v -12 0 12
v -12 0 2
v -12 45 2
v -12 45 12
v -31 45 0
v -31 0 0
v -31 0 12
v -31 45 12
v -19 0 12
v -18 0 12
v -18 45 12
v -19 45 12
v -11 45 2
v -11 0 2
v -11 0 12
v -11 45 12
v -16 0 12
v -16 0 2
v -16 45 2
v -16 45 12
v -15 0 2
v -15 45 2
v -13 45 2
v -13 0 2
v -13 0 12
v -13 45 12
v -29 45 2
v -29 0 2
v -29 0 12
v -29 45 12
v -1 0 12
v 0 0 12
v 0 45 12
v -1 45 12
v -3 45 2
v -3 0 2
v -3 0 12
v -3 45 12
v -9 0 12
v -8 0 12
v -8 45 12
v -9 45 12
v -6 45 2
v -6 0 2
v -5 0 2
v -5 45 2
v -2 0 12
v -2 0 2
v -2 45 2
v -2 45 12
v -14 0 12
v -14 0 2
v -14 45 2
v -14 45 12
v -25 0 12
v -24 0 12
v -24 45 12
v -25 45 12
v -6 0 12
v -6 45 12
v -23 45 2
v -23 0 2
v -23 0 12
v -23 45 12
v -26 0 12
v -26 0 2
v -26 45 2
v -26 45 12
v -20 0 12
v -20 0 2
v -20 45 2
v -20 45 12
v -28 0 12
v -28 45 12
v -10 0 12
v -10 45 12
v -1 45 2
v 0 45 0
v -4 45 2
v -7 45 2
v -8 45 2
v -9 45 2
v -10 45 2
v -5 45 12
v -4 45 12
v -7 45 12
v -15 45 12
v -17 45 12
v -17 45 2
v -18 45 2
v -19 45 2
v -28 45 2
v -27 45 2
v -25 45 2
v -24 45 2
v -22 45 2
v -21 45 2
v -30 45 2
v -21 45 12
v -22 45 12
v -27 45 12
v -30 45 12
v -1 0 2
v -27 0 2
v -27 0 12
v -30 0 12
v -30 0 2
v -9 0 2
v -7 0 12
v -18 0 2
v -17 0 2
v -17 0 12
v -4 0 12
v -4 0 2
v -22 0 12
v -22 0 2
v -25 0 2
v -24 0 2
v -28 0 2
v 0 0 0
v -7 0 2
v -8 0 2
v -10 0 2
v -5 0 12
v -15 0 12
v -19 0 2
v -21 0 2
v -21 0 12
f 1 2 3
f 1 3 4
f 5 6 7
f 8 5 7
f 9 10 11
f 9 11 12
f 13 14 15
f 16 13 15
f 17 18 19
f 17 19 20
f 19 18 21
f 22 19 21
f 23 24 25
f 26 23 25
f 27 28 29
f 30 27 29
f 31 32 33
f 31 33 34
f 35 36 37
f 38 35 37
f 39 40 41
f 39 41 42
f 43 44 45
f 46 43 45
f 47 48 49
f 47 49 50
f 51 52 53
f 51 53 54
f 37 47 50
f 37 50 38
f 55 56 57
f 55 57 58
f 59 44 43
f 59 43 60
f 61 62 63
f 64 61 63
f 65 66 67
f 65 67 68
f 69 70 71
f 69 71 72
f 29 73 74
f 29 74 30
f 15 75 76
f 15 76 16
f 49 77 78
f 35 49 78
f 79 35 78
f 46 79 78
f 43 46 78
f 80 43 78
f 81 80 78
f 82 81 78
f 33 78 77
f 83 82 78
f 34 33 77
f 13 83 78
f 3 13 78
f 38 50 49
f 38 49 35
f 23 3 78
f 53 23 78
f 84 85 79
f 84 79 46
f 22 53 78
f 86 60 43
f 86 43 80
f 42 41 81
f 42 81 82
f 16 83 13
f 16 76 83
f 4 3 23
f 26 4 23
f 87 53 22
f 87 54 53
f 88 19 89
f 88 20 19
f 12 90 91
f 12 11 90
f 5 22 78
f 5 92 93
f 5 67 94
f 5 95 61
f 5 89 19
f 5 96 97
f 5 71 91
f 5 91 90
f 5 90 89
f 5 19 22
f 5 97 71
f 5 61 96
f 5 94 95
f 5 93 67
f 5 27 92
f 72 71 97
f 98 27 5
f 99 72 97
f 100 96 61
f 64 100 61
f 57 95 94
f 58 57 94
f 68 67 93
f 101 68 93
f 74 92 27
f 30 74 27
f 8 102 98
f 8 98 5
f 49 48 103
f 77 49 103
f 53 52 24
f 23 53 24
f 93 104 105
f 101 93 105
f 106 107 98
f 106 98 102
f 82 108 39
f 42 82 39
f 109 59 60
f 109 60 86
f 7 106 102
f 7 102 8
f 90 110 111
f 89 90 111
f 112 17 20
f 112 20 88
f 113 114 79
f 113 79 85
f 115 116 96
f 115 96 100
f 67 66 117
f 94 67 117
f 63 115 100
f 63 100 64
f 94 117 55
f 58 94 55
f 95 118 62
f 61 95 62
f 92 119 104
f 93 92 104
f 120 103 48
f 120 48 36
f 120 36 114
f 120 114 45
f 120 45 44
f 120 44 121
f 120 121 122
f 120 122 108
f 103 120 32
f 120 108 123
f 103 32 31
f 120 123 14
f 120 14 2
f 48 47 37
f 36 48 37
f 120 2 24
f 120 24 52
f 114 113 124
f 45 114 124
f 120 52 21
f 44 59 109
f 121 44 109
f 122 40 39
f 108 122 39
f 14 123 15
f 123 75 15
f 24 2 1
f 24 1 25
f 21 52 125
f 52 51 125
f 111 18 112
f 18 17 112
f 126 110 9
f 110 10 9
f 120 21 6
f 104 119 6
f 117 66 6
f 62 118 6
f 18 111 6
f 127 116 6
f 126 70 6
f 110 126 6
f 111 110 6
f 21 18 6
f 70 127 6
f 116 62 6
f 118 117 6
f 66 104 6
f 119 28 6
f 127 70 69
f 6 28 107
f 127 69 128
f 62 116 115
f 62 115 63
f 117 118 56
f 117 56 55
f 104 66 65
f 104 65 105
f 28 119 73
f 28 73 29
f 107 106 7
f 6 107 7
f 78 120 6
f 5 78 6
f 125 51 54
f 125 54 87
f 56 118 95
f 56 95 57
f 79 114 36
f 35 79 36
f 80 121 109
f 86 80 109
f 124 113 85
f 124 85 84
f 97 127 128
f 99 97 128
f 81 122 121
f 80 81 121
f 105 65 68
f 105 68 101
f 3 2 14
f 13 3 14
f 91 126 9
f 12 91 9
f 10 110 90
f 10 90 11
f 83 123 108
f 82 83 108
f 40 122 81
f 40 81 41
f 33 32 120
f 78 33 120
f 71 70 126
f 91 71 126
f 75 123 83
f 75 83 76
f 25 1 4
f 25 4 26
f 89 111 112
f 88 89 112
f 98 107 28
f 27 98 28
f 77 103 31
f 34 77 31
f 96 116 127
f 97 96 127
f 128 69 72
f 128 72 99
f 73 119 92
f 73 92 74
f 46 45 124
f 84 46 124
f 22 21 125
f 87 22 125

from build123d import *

# Parameters (mm, degrees)
SKETCH1_W           = 1
SKETCH1_H           = 10
BOSS_EXTRUDE1_DEPTH = 45


with BuildPart() as part:
    # Sketch1 → Boss-Extrude1 (new body)
    with BuildSketch(Plane(origin=(0, 0, 0), x_dir=(-1, 0, 0), z_dir=(0, 1, 0))):
        with Locations((0.5, 7)):
            Rectangle(SKETCH1_W, SKETCH1_H)
        Polygon((1, 2), (0, 2), (0, 0), (31, 0), (31, 2), (30, 2), (29, 2), (28, 2), (27, 2), (26, 2), (25, 2), (24, 2), (23, 2), (22, 2), (21, 2), (20, 2), (19, 2), (18, 2), (17, 2), (16, 2), (15, 2), (14, 2), (13, 2), (12, 2), (11, 2), (10, 2), (9, 2), (8, 2), (7, 2), (6, 2), (5, 2), (4, 2), (3, 2), (2, 2), align=None)
        with Locations((2.5, 7)):
            Rectangle(SKETCH1_W, SKETCH1_H)
        with Locations((4.5, 7)):
            Rectangle(SKETCH1_W, SKETCH1_H)
        with Locations((6.5, 7)):
            Rectangle(SKETCH1_W, SKETCH1_H)
        with Locations((8.5, 7)):
            Rectangle(SKETCH1_W, SKETCH1_H)
        with Locations((10.5, 7)):
            Rectangle(SKETCH1_W, SKETCH1_H)
        with Locations((12.5, 7)):
            Rectangle(SKETCH1_W, SKETCH1_H)
        with Locations((14.5, 7)):
            Rectangle(SKETCH1_W, SKETCH1_H)
        with Locations((16.5, 7)):
            Rectangle(SKETCH1_W, SKETCH1_H)
        with Locations((18.5, 7)):
            Rectangle(SKETCH1_W, SKETCH1_H)
        with Locations((20.5, 7)):
            Rectangle(SKETCH1_W, SKETCH1_H)
        with Locations((22.5, 7)):
            Rectangle(SKETCH1_W, SKETCH1_H)
        with Locations((24.5, 7)):
            Rectangle(SKETCH1_W, SKETCH1_H)
        with Locations((26.5, 7)):
            Rectangle(SKETCH1_W, SKETCH1_H)
        with Locations((28.5, 7)):
            Rectangle(SKETCH1_W, SKETCH1_H)
        with Locations((30.5, 7)):
            Rectangle(SKETCH1_W, SKETCH1_H)
    extrude(amount=BOSS_EXTRUDE1_DEPTH)


solid = part.part
